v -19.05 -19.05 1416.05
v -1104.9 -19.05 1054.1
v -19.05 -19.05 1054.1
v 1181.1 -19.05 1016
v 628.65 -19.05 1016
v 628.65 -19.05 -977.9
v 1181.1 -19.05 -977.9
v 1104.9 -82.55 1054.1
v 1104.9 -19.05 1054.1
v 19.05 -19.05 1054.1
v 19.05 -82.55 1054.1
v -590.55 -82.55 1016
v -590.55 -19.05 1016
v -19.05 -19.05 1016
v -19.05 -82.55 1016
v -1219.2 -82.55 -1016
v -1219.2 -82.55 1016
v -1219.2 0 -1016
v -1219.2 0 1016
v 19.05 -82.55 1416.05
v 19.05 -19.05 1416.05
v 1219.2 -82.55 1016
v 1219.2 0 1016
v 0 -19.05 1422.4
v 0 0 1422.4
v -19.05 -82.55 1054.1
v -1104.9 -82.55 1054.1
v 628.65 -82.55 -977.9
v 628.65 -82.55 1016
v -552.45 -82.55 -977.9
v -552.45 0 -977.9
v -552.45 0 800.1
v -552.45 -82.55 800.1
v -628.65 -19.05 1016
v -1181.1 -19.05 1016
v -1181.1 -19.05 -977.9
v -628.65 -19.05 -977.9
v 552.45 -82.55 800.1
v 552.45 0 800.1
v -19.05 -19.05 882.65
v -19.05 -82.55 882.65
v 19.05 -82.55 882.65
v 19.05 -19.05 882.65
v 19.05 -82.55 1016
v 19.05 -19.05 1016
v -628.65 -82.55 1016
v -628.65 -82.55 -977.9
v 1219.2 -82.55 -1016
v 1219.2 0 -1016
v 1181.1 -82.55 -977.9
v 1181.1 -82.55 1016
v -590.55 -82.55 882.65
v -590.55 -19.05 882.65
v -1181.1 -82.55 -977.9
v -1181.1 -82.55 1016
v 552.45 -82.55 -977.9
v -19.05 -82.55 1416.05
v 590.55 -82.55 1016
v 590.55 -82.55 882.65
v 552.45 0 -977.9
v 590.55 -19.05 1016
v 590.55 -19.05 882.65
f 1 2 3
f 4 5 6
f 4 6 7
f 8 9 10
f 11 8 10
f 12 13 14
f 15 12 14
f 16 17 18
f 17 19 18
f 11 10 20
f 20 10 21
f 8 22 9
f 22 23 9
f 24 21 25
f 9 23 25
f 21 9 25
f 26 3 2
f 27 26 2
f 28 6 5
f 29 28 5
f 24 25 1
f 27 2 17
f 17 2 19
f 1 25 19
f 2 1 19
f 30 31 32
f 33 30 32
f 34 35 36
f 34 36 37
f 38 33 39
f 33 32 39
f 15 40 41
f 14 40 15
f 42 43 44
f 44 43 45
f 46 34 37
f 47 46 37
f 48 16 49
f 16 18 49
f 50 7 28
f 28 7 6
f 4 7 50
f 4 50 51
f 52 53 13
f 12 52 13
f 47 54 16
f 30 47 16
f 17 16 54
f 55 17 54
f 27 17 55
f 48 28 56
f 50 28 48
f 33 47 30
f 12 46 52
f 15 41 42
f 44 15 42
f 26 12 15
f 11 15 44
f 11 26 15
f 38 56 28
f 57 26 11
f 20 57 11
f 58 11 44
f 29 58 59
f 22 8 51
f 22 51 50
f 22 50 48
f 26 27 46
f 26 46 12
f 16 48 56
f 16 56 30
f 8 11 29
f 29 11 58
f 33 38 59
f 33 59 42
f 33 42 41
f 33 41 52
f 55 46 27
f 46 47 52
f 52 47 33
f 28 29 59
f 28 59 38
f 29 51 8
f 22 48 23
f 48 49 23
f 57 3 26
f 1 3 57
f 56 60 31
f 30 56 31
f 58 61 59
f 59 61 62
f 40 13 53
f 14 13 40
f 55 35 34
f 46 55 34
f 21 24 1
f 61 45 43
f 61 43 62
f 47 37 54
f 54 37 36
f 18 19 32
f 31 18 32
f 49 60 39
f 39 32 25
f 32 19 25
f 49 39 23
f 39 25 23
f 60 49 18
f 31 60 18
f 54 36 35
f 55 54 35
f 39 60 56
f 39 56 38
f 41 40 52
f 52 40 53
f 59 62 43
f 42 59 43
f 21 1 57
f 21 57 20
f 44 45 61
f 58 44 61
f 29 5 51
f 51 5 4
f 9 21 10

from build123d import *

# Parameters (mm, degrees)
F0_W     = 106.02127
F0_H     = 2032
F1_DEPTH = 19.05
F2_W     = 38.1
F2_H     = 361.95
F2_H_2   = 133.35
F2_H_3   = 1993.9
F3_DEPTH = 63.5
F2_H_4   = 1778
F2_W_2   = 1181.1
F2_H_5   = 6.35
F4_DEPTH = 63.5
F2_W_3   = 1104.9
F5_DEPTH = 19.05


with BuildPart() as f1:
    # F0 (on Front) → F1 (new body)
    with BuildSketch(Plane.XZ):
        Polygon((-1113.17873, -1016), (1219.2, -1016), (1219.2, 1016), (0, 1422.4), (-1219.2, 1016), (-1113.17873, 1016), align=None)
        with Locations((-1166.189365, 0)):
            Rectangle(F0_W, F0_H)
    extrude(amount=F1_DEPTH)

    # F2 (on face) → F3 (join)
    with BuildSketch(Plane.XZ.offset(19.05)):
        with Locations((0, 1235.075)):
            Rectangle(F2_W, F2_H)
        Polygon((-1104.9, 1054.1), (-1219.2, 1016), (-1181.1, 1016), (-628.65, 1016), (-590.55, 1016), (-19.05, 1016), (19.05, 1016), (590.55, 1016), (628.65, 1016), (1181.1, 1016), (1219.2, 1016), (1104.9, 1054.1), (19.05, 1054.1), (-19.05, 1054.1), align=None)
        with Locations((0, 949.325)):
            Rectangle(F2_W, F2_H_2)
        Polygon((-590.55, 1016), (-628.65, 1016), (-628.65, -977.9), (-590.55, -977.9), (-590.55, 800.1), (-590.55, 838.2), (-590.55, 844.55), (-590.55, 882.65), align=None)
        Polygon((628.65, 1016), (590.55, 1016), (590.55, 882.65), (590.55, 844.55), (590.55, 838.2), (590.55, 800.1), (590.55, -977.9), (628.65, -977.9), align=None)
        with Locations((1200.15, 19.05)):
            Rectangle(F2_W, F2_H_3)
        with Locations((-1200.15, 19.05)):
            Rectangle(F2_W, F2_H_3)
        Polygon((-1181.1, -977.9), (-1219.2, -977.9), (-1219.2, -1016), (-609.6, -1016), (-590.55, -1016), (1219.2, -1016), (1219.2, -977.9), (1181.1, -977.9), (628.65, -977.9), (590.55, -977.9), (552.45, -977.9), (-552.45, -977.9), (-590.55, -977.9), (-628.65, -977.9), align=None)
    extrude(amount=F3_DEPTH)

    # F2 (on face) → F4 (join)
    with BuildSketch(Plane.XZ.offset(19.05)):
        with Locations((-571.5, -88.9)):
            Rectangle(F2_W, F2_H_4)
        with Locations((571.5, -88.9)):
            Rectangle(F2_W, F2_H_4)
        Polygon((-19.05, 882.65), (-590.55, 882.65), (-590.55, 844.55), (590.55, 844.55), (590.55, 882.65), (19.05, 882.65), align=None)
        Polygon((-590.55, 838.2), (-590.55, 800.1), (-552.45, 800.1), (552.45, 800.1), (590.55, 800.1), (590.55, 838.2), align=None)
        with Locations((0, 841.375)):
            Rectangle(F2_W_2, F2_H_5)
    extrude(amount=F4_DEPTH)

    # F2 (on face) → F5 (cut, through all)
    with BuildSketch(Plane.XZ.offset(19.05)):
        with Locations((0, -88.9)):
            Rectangle(F2_W_3, F2_H_4)
    extrude(amount=-F5_DEPTH, mode=Mode.SUBTRACT)


solid = f1.part
